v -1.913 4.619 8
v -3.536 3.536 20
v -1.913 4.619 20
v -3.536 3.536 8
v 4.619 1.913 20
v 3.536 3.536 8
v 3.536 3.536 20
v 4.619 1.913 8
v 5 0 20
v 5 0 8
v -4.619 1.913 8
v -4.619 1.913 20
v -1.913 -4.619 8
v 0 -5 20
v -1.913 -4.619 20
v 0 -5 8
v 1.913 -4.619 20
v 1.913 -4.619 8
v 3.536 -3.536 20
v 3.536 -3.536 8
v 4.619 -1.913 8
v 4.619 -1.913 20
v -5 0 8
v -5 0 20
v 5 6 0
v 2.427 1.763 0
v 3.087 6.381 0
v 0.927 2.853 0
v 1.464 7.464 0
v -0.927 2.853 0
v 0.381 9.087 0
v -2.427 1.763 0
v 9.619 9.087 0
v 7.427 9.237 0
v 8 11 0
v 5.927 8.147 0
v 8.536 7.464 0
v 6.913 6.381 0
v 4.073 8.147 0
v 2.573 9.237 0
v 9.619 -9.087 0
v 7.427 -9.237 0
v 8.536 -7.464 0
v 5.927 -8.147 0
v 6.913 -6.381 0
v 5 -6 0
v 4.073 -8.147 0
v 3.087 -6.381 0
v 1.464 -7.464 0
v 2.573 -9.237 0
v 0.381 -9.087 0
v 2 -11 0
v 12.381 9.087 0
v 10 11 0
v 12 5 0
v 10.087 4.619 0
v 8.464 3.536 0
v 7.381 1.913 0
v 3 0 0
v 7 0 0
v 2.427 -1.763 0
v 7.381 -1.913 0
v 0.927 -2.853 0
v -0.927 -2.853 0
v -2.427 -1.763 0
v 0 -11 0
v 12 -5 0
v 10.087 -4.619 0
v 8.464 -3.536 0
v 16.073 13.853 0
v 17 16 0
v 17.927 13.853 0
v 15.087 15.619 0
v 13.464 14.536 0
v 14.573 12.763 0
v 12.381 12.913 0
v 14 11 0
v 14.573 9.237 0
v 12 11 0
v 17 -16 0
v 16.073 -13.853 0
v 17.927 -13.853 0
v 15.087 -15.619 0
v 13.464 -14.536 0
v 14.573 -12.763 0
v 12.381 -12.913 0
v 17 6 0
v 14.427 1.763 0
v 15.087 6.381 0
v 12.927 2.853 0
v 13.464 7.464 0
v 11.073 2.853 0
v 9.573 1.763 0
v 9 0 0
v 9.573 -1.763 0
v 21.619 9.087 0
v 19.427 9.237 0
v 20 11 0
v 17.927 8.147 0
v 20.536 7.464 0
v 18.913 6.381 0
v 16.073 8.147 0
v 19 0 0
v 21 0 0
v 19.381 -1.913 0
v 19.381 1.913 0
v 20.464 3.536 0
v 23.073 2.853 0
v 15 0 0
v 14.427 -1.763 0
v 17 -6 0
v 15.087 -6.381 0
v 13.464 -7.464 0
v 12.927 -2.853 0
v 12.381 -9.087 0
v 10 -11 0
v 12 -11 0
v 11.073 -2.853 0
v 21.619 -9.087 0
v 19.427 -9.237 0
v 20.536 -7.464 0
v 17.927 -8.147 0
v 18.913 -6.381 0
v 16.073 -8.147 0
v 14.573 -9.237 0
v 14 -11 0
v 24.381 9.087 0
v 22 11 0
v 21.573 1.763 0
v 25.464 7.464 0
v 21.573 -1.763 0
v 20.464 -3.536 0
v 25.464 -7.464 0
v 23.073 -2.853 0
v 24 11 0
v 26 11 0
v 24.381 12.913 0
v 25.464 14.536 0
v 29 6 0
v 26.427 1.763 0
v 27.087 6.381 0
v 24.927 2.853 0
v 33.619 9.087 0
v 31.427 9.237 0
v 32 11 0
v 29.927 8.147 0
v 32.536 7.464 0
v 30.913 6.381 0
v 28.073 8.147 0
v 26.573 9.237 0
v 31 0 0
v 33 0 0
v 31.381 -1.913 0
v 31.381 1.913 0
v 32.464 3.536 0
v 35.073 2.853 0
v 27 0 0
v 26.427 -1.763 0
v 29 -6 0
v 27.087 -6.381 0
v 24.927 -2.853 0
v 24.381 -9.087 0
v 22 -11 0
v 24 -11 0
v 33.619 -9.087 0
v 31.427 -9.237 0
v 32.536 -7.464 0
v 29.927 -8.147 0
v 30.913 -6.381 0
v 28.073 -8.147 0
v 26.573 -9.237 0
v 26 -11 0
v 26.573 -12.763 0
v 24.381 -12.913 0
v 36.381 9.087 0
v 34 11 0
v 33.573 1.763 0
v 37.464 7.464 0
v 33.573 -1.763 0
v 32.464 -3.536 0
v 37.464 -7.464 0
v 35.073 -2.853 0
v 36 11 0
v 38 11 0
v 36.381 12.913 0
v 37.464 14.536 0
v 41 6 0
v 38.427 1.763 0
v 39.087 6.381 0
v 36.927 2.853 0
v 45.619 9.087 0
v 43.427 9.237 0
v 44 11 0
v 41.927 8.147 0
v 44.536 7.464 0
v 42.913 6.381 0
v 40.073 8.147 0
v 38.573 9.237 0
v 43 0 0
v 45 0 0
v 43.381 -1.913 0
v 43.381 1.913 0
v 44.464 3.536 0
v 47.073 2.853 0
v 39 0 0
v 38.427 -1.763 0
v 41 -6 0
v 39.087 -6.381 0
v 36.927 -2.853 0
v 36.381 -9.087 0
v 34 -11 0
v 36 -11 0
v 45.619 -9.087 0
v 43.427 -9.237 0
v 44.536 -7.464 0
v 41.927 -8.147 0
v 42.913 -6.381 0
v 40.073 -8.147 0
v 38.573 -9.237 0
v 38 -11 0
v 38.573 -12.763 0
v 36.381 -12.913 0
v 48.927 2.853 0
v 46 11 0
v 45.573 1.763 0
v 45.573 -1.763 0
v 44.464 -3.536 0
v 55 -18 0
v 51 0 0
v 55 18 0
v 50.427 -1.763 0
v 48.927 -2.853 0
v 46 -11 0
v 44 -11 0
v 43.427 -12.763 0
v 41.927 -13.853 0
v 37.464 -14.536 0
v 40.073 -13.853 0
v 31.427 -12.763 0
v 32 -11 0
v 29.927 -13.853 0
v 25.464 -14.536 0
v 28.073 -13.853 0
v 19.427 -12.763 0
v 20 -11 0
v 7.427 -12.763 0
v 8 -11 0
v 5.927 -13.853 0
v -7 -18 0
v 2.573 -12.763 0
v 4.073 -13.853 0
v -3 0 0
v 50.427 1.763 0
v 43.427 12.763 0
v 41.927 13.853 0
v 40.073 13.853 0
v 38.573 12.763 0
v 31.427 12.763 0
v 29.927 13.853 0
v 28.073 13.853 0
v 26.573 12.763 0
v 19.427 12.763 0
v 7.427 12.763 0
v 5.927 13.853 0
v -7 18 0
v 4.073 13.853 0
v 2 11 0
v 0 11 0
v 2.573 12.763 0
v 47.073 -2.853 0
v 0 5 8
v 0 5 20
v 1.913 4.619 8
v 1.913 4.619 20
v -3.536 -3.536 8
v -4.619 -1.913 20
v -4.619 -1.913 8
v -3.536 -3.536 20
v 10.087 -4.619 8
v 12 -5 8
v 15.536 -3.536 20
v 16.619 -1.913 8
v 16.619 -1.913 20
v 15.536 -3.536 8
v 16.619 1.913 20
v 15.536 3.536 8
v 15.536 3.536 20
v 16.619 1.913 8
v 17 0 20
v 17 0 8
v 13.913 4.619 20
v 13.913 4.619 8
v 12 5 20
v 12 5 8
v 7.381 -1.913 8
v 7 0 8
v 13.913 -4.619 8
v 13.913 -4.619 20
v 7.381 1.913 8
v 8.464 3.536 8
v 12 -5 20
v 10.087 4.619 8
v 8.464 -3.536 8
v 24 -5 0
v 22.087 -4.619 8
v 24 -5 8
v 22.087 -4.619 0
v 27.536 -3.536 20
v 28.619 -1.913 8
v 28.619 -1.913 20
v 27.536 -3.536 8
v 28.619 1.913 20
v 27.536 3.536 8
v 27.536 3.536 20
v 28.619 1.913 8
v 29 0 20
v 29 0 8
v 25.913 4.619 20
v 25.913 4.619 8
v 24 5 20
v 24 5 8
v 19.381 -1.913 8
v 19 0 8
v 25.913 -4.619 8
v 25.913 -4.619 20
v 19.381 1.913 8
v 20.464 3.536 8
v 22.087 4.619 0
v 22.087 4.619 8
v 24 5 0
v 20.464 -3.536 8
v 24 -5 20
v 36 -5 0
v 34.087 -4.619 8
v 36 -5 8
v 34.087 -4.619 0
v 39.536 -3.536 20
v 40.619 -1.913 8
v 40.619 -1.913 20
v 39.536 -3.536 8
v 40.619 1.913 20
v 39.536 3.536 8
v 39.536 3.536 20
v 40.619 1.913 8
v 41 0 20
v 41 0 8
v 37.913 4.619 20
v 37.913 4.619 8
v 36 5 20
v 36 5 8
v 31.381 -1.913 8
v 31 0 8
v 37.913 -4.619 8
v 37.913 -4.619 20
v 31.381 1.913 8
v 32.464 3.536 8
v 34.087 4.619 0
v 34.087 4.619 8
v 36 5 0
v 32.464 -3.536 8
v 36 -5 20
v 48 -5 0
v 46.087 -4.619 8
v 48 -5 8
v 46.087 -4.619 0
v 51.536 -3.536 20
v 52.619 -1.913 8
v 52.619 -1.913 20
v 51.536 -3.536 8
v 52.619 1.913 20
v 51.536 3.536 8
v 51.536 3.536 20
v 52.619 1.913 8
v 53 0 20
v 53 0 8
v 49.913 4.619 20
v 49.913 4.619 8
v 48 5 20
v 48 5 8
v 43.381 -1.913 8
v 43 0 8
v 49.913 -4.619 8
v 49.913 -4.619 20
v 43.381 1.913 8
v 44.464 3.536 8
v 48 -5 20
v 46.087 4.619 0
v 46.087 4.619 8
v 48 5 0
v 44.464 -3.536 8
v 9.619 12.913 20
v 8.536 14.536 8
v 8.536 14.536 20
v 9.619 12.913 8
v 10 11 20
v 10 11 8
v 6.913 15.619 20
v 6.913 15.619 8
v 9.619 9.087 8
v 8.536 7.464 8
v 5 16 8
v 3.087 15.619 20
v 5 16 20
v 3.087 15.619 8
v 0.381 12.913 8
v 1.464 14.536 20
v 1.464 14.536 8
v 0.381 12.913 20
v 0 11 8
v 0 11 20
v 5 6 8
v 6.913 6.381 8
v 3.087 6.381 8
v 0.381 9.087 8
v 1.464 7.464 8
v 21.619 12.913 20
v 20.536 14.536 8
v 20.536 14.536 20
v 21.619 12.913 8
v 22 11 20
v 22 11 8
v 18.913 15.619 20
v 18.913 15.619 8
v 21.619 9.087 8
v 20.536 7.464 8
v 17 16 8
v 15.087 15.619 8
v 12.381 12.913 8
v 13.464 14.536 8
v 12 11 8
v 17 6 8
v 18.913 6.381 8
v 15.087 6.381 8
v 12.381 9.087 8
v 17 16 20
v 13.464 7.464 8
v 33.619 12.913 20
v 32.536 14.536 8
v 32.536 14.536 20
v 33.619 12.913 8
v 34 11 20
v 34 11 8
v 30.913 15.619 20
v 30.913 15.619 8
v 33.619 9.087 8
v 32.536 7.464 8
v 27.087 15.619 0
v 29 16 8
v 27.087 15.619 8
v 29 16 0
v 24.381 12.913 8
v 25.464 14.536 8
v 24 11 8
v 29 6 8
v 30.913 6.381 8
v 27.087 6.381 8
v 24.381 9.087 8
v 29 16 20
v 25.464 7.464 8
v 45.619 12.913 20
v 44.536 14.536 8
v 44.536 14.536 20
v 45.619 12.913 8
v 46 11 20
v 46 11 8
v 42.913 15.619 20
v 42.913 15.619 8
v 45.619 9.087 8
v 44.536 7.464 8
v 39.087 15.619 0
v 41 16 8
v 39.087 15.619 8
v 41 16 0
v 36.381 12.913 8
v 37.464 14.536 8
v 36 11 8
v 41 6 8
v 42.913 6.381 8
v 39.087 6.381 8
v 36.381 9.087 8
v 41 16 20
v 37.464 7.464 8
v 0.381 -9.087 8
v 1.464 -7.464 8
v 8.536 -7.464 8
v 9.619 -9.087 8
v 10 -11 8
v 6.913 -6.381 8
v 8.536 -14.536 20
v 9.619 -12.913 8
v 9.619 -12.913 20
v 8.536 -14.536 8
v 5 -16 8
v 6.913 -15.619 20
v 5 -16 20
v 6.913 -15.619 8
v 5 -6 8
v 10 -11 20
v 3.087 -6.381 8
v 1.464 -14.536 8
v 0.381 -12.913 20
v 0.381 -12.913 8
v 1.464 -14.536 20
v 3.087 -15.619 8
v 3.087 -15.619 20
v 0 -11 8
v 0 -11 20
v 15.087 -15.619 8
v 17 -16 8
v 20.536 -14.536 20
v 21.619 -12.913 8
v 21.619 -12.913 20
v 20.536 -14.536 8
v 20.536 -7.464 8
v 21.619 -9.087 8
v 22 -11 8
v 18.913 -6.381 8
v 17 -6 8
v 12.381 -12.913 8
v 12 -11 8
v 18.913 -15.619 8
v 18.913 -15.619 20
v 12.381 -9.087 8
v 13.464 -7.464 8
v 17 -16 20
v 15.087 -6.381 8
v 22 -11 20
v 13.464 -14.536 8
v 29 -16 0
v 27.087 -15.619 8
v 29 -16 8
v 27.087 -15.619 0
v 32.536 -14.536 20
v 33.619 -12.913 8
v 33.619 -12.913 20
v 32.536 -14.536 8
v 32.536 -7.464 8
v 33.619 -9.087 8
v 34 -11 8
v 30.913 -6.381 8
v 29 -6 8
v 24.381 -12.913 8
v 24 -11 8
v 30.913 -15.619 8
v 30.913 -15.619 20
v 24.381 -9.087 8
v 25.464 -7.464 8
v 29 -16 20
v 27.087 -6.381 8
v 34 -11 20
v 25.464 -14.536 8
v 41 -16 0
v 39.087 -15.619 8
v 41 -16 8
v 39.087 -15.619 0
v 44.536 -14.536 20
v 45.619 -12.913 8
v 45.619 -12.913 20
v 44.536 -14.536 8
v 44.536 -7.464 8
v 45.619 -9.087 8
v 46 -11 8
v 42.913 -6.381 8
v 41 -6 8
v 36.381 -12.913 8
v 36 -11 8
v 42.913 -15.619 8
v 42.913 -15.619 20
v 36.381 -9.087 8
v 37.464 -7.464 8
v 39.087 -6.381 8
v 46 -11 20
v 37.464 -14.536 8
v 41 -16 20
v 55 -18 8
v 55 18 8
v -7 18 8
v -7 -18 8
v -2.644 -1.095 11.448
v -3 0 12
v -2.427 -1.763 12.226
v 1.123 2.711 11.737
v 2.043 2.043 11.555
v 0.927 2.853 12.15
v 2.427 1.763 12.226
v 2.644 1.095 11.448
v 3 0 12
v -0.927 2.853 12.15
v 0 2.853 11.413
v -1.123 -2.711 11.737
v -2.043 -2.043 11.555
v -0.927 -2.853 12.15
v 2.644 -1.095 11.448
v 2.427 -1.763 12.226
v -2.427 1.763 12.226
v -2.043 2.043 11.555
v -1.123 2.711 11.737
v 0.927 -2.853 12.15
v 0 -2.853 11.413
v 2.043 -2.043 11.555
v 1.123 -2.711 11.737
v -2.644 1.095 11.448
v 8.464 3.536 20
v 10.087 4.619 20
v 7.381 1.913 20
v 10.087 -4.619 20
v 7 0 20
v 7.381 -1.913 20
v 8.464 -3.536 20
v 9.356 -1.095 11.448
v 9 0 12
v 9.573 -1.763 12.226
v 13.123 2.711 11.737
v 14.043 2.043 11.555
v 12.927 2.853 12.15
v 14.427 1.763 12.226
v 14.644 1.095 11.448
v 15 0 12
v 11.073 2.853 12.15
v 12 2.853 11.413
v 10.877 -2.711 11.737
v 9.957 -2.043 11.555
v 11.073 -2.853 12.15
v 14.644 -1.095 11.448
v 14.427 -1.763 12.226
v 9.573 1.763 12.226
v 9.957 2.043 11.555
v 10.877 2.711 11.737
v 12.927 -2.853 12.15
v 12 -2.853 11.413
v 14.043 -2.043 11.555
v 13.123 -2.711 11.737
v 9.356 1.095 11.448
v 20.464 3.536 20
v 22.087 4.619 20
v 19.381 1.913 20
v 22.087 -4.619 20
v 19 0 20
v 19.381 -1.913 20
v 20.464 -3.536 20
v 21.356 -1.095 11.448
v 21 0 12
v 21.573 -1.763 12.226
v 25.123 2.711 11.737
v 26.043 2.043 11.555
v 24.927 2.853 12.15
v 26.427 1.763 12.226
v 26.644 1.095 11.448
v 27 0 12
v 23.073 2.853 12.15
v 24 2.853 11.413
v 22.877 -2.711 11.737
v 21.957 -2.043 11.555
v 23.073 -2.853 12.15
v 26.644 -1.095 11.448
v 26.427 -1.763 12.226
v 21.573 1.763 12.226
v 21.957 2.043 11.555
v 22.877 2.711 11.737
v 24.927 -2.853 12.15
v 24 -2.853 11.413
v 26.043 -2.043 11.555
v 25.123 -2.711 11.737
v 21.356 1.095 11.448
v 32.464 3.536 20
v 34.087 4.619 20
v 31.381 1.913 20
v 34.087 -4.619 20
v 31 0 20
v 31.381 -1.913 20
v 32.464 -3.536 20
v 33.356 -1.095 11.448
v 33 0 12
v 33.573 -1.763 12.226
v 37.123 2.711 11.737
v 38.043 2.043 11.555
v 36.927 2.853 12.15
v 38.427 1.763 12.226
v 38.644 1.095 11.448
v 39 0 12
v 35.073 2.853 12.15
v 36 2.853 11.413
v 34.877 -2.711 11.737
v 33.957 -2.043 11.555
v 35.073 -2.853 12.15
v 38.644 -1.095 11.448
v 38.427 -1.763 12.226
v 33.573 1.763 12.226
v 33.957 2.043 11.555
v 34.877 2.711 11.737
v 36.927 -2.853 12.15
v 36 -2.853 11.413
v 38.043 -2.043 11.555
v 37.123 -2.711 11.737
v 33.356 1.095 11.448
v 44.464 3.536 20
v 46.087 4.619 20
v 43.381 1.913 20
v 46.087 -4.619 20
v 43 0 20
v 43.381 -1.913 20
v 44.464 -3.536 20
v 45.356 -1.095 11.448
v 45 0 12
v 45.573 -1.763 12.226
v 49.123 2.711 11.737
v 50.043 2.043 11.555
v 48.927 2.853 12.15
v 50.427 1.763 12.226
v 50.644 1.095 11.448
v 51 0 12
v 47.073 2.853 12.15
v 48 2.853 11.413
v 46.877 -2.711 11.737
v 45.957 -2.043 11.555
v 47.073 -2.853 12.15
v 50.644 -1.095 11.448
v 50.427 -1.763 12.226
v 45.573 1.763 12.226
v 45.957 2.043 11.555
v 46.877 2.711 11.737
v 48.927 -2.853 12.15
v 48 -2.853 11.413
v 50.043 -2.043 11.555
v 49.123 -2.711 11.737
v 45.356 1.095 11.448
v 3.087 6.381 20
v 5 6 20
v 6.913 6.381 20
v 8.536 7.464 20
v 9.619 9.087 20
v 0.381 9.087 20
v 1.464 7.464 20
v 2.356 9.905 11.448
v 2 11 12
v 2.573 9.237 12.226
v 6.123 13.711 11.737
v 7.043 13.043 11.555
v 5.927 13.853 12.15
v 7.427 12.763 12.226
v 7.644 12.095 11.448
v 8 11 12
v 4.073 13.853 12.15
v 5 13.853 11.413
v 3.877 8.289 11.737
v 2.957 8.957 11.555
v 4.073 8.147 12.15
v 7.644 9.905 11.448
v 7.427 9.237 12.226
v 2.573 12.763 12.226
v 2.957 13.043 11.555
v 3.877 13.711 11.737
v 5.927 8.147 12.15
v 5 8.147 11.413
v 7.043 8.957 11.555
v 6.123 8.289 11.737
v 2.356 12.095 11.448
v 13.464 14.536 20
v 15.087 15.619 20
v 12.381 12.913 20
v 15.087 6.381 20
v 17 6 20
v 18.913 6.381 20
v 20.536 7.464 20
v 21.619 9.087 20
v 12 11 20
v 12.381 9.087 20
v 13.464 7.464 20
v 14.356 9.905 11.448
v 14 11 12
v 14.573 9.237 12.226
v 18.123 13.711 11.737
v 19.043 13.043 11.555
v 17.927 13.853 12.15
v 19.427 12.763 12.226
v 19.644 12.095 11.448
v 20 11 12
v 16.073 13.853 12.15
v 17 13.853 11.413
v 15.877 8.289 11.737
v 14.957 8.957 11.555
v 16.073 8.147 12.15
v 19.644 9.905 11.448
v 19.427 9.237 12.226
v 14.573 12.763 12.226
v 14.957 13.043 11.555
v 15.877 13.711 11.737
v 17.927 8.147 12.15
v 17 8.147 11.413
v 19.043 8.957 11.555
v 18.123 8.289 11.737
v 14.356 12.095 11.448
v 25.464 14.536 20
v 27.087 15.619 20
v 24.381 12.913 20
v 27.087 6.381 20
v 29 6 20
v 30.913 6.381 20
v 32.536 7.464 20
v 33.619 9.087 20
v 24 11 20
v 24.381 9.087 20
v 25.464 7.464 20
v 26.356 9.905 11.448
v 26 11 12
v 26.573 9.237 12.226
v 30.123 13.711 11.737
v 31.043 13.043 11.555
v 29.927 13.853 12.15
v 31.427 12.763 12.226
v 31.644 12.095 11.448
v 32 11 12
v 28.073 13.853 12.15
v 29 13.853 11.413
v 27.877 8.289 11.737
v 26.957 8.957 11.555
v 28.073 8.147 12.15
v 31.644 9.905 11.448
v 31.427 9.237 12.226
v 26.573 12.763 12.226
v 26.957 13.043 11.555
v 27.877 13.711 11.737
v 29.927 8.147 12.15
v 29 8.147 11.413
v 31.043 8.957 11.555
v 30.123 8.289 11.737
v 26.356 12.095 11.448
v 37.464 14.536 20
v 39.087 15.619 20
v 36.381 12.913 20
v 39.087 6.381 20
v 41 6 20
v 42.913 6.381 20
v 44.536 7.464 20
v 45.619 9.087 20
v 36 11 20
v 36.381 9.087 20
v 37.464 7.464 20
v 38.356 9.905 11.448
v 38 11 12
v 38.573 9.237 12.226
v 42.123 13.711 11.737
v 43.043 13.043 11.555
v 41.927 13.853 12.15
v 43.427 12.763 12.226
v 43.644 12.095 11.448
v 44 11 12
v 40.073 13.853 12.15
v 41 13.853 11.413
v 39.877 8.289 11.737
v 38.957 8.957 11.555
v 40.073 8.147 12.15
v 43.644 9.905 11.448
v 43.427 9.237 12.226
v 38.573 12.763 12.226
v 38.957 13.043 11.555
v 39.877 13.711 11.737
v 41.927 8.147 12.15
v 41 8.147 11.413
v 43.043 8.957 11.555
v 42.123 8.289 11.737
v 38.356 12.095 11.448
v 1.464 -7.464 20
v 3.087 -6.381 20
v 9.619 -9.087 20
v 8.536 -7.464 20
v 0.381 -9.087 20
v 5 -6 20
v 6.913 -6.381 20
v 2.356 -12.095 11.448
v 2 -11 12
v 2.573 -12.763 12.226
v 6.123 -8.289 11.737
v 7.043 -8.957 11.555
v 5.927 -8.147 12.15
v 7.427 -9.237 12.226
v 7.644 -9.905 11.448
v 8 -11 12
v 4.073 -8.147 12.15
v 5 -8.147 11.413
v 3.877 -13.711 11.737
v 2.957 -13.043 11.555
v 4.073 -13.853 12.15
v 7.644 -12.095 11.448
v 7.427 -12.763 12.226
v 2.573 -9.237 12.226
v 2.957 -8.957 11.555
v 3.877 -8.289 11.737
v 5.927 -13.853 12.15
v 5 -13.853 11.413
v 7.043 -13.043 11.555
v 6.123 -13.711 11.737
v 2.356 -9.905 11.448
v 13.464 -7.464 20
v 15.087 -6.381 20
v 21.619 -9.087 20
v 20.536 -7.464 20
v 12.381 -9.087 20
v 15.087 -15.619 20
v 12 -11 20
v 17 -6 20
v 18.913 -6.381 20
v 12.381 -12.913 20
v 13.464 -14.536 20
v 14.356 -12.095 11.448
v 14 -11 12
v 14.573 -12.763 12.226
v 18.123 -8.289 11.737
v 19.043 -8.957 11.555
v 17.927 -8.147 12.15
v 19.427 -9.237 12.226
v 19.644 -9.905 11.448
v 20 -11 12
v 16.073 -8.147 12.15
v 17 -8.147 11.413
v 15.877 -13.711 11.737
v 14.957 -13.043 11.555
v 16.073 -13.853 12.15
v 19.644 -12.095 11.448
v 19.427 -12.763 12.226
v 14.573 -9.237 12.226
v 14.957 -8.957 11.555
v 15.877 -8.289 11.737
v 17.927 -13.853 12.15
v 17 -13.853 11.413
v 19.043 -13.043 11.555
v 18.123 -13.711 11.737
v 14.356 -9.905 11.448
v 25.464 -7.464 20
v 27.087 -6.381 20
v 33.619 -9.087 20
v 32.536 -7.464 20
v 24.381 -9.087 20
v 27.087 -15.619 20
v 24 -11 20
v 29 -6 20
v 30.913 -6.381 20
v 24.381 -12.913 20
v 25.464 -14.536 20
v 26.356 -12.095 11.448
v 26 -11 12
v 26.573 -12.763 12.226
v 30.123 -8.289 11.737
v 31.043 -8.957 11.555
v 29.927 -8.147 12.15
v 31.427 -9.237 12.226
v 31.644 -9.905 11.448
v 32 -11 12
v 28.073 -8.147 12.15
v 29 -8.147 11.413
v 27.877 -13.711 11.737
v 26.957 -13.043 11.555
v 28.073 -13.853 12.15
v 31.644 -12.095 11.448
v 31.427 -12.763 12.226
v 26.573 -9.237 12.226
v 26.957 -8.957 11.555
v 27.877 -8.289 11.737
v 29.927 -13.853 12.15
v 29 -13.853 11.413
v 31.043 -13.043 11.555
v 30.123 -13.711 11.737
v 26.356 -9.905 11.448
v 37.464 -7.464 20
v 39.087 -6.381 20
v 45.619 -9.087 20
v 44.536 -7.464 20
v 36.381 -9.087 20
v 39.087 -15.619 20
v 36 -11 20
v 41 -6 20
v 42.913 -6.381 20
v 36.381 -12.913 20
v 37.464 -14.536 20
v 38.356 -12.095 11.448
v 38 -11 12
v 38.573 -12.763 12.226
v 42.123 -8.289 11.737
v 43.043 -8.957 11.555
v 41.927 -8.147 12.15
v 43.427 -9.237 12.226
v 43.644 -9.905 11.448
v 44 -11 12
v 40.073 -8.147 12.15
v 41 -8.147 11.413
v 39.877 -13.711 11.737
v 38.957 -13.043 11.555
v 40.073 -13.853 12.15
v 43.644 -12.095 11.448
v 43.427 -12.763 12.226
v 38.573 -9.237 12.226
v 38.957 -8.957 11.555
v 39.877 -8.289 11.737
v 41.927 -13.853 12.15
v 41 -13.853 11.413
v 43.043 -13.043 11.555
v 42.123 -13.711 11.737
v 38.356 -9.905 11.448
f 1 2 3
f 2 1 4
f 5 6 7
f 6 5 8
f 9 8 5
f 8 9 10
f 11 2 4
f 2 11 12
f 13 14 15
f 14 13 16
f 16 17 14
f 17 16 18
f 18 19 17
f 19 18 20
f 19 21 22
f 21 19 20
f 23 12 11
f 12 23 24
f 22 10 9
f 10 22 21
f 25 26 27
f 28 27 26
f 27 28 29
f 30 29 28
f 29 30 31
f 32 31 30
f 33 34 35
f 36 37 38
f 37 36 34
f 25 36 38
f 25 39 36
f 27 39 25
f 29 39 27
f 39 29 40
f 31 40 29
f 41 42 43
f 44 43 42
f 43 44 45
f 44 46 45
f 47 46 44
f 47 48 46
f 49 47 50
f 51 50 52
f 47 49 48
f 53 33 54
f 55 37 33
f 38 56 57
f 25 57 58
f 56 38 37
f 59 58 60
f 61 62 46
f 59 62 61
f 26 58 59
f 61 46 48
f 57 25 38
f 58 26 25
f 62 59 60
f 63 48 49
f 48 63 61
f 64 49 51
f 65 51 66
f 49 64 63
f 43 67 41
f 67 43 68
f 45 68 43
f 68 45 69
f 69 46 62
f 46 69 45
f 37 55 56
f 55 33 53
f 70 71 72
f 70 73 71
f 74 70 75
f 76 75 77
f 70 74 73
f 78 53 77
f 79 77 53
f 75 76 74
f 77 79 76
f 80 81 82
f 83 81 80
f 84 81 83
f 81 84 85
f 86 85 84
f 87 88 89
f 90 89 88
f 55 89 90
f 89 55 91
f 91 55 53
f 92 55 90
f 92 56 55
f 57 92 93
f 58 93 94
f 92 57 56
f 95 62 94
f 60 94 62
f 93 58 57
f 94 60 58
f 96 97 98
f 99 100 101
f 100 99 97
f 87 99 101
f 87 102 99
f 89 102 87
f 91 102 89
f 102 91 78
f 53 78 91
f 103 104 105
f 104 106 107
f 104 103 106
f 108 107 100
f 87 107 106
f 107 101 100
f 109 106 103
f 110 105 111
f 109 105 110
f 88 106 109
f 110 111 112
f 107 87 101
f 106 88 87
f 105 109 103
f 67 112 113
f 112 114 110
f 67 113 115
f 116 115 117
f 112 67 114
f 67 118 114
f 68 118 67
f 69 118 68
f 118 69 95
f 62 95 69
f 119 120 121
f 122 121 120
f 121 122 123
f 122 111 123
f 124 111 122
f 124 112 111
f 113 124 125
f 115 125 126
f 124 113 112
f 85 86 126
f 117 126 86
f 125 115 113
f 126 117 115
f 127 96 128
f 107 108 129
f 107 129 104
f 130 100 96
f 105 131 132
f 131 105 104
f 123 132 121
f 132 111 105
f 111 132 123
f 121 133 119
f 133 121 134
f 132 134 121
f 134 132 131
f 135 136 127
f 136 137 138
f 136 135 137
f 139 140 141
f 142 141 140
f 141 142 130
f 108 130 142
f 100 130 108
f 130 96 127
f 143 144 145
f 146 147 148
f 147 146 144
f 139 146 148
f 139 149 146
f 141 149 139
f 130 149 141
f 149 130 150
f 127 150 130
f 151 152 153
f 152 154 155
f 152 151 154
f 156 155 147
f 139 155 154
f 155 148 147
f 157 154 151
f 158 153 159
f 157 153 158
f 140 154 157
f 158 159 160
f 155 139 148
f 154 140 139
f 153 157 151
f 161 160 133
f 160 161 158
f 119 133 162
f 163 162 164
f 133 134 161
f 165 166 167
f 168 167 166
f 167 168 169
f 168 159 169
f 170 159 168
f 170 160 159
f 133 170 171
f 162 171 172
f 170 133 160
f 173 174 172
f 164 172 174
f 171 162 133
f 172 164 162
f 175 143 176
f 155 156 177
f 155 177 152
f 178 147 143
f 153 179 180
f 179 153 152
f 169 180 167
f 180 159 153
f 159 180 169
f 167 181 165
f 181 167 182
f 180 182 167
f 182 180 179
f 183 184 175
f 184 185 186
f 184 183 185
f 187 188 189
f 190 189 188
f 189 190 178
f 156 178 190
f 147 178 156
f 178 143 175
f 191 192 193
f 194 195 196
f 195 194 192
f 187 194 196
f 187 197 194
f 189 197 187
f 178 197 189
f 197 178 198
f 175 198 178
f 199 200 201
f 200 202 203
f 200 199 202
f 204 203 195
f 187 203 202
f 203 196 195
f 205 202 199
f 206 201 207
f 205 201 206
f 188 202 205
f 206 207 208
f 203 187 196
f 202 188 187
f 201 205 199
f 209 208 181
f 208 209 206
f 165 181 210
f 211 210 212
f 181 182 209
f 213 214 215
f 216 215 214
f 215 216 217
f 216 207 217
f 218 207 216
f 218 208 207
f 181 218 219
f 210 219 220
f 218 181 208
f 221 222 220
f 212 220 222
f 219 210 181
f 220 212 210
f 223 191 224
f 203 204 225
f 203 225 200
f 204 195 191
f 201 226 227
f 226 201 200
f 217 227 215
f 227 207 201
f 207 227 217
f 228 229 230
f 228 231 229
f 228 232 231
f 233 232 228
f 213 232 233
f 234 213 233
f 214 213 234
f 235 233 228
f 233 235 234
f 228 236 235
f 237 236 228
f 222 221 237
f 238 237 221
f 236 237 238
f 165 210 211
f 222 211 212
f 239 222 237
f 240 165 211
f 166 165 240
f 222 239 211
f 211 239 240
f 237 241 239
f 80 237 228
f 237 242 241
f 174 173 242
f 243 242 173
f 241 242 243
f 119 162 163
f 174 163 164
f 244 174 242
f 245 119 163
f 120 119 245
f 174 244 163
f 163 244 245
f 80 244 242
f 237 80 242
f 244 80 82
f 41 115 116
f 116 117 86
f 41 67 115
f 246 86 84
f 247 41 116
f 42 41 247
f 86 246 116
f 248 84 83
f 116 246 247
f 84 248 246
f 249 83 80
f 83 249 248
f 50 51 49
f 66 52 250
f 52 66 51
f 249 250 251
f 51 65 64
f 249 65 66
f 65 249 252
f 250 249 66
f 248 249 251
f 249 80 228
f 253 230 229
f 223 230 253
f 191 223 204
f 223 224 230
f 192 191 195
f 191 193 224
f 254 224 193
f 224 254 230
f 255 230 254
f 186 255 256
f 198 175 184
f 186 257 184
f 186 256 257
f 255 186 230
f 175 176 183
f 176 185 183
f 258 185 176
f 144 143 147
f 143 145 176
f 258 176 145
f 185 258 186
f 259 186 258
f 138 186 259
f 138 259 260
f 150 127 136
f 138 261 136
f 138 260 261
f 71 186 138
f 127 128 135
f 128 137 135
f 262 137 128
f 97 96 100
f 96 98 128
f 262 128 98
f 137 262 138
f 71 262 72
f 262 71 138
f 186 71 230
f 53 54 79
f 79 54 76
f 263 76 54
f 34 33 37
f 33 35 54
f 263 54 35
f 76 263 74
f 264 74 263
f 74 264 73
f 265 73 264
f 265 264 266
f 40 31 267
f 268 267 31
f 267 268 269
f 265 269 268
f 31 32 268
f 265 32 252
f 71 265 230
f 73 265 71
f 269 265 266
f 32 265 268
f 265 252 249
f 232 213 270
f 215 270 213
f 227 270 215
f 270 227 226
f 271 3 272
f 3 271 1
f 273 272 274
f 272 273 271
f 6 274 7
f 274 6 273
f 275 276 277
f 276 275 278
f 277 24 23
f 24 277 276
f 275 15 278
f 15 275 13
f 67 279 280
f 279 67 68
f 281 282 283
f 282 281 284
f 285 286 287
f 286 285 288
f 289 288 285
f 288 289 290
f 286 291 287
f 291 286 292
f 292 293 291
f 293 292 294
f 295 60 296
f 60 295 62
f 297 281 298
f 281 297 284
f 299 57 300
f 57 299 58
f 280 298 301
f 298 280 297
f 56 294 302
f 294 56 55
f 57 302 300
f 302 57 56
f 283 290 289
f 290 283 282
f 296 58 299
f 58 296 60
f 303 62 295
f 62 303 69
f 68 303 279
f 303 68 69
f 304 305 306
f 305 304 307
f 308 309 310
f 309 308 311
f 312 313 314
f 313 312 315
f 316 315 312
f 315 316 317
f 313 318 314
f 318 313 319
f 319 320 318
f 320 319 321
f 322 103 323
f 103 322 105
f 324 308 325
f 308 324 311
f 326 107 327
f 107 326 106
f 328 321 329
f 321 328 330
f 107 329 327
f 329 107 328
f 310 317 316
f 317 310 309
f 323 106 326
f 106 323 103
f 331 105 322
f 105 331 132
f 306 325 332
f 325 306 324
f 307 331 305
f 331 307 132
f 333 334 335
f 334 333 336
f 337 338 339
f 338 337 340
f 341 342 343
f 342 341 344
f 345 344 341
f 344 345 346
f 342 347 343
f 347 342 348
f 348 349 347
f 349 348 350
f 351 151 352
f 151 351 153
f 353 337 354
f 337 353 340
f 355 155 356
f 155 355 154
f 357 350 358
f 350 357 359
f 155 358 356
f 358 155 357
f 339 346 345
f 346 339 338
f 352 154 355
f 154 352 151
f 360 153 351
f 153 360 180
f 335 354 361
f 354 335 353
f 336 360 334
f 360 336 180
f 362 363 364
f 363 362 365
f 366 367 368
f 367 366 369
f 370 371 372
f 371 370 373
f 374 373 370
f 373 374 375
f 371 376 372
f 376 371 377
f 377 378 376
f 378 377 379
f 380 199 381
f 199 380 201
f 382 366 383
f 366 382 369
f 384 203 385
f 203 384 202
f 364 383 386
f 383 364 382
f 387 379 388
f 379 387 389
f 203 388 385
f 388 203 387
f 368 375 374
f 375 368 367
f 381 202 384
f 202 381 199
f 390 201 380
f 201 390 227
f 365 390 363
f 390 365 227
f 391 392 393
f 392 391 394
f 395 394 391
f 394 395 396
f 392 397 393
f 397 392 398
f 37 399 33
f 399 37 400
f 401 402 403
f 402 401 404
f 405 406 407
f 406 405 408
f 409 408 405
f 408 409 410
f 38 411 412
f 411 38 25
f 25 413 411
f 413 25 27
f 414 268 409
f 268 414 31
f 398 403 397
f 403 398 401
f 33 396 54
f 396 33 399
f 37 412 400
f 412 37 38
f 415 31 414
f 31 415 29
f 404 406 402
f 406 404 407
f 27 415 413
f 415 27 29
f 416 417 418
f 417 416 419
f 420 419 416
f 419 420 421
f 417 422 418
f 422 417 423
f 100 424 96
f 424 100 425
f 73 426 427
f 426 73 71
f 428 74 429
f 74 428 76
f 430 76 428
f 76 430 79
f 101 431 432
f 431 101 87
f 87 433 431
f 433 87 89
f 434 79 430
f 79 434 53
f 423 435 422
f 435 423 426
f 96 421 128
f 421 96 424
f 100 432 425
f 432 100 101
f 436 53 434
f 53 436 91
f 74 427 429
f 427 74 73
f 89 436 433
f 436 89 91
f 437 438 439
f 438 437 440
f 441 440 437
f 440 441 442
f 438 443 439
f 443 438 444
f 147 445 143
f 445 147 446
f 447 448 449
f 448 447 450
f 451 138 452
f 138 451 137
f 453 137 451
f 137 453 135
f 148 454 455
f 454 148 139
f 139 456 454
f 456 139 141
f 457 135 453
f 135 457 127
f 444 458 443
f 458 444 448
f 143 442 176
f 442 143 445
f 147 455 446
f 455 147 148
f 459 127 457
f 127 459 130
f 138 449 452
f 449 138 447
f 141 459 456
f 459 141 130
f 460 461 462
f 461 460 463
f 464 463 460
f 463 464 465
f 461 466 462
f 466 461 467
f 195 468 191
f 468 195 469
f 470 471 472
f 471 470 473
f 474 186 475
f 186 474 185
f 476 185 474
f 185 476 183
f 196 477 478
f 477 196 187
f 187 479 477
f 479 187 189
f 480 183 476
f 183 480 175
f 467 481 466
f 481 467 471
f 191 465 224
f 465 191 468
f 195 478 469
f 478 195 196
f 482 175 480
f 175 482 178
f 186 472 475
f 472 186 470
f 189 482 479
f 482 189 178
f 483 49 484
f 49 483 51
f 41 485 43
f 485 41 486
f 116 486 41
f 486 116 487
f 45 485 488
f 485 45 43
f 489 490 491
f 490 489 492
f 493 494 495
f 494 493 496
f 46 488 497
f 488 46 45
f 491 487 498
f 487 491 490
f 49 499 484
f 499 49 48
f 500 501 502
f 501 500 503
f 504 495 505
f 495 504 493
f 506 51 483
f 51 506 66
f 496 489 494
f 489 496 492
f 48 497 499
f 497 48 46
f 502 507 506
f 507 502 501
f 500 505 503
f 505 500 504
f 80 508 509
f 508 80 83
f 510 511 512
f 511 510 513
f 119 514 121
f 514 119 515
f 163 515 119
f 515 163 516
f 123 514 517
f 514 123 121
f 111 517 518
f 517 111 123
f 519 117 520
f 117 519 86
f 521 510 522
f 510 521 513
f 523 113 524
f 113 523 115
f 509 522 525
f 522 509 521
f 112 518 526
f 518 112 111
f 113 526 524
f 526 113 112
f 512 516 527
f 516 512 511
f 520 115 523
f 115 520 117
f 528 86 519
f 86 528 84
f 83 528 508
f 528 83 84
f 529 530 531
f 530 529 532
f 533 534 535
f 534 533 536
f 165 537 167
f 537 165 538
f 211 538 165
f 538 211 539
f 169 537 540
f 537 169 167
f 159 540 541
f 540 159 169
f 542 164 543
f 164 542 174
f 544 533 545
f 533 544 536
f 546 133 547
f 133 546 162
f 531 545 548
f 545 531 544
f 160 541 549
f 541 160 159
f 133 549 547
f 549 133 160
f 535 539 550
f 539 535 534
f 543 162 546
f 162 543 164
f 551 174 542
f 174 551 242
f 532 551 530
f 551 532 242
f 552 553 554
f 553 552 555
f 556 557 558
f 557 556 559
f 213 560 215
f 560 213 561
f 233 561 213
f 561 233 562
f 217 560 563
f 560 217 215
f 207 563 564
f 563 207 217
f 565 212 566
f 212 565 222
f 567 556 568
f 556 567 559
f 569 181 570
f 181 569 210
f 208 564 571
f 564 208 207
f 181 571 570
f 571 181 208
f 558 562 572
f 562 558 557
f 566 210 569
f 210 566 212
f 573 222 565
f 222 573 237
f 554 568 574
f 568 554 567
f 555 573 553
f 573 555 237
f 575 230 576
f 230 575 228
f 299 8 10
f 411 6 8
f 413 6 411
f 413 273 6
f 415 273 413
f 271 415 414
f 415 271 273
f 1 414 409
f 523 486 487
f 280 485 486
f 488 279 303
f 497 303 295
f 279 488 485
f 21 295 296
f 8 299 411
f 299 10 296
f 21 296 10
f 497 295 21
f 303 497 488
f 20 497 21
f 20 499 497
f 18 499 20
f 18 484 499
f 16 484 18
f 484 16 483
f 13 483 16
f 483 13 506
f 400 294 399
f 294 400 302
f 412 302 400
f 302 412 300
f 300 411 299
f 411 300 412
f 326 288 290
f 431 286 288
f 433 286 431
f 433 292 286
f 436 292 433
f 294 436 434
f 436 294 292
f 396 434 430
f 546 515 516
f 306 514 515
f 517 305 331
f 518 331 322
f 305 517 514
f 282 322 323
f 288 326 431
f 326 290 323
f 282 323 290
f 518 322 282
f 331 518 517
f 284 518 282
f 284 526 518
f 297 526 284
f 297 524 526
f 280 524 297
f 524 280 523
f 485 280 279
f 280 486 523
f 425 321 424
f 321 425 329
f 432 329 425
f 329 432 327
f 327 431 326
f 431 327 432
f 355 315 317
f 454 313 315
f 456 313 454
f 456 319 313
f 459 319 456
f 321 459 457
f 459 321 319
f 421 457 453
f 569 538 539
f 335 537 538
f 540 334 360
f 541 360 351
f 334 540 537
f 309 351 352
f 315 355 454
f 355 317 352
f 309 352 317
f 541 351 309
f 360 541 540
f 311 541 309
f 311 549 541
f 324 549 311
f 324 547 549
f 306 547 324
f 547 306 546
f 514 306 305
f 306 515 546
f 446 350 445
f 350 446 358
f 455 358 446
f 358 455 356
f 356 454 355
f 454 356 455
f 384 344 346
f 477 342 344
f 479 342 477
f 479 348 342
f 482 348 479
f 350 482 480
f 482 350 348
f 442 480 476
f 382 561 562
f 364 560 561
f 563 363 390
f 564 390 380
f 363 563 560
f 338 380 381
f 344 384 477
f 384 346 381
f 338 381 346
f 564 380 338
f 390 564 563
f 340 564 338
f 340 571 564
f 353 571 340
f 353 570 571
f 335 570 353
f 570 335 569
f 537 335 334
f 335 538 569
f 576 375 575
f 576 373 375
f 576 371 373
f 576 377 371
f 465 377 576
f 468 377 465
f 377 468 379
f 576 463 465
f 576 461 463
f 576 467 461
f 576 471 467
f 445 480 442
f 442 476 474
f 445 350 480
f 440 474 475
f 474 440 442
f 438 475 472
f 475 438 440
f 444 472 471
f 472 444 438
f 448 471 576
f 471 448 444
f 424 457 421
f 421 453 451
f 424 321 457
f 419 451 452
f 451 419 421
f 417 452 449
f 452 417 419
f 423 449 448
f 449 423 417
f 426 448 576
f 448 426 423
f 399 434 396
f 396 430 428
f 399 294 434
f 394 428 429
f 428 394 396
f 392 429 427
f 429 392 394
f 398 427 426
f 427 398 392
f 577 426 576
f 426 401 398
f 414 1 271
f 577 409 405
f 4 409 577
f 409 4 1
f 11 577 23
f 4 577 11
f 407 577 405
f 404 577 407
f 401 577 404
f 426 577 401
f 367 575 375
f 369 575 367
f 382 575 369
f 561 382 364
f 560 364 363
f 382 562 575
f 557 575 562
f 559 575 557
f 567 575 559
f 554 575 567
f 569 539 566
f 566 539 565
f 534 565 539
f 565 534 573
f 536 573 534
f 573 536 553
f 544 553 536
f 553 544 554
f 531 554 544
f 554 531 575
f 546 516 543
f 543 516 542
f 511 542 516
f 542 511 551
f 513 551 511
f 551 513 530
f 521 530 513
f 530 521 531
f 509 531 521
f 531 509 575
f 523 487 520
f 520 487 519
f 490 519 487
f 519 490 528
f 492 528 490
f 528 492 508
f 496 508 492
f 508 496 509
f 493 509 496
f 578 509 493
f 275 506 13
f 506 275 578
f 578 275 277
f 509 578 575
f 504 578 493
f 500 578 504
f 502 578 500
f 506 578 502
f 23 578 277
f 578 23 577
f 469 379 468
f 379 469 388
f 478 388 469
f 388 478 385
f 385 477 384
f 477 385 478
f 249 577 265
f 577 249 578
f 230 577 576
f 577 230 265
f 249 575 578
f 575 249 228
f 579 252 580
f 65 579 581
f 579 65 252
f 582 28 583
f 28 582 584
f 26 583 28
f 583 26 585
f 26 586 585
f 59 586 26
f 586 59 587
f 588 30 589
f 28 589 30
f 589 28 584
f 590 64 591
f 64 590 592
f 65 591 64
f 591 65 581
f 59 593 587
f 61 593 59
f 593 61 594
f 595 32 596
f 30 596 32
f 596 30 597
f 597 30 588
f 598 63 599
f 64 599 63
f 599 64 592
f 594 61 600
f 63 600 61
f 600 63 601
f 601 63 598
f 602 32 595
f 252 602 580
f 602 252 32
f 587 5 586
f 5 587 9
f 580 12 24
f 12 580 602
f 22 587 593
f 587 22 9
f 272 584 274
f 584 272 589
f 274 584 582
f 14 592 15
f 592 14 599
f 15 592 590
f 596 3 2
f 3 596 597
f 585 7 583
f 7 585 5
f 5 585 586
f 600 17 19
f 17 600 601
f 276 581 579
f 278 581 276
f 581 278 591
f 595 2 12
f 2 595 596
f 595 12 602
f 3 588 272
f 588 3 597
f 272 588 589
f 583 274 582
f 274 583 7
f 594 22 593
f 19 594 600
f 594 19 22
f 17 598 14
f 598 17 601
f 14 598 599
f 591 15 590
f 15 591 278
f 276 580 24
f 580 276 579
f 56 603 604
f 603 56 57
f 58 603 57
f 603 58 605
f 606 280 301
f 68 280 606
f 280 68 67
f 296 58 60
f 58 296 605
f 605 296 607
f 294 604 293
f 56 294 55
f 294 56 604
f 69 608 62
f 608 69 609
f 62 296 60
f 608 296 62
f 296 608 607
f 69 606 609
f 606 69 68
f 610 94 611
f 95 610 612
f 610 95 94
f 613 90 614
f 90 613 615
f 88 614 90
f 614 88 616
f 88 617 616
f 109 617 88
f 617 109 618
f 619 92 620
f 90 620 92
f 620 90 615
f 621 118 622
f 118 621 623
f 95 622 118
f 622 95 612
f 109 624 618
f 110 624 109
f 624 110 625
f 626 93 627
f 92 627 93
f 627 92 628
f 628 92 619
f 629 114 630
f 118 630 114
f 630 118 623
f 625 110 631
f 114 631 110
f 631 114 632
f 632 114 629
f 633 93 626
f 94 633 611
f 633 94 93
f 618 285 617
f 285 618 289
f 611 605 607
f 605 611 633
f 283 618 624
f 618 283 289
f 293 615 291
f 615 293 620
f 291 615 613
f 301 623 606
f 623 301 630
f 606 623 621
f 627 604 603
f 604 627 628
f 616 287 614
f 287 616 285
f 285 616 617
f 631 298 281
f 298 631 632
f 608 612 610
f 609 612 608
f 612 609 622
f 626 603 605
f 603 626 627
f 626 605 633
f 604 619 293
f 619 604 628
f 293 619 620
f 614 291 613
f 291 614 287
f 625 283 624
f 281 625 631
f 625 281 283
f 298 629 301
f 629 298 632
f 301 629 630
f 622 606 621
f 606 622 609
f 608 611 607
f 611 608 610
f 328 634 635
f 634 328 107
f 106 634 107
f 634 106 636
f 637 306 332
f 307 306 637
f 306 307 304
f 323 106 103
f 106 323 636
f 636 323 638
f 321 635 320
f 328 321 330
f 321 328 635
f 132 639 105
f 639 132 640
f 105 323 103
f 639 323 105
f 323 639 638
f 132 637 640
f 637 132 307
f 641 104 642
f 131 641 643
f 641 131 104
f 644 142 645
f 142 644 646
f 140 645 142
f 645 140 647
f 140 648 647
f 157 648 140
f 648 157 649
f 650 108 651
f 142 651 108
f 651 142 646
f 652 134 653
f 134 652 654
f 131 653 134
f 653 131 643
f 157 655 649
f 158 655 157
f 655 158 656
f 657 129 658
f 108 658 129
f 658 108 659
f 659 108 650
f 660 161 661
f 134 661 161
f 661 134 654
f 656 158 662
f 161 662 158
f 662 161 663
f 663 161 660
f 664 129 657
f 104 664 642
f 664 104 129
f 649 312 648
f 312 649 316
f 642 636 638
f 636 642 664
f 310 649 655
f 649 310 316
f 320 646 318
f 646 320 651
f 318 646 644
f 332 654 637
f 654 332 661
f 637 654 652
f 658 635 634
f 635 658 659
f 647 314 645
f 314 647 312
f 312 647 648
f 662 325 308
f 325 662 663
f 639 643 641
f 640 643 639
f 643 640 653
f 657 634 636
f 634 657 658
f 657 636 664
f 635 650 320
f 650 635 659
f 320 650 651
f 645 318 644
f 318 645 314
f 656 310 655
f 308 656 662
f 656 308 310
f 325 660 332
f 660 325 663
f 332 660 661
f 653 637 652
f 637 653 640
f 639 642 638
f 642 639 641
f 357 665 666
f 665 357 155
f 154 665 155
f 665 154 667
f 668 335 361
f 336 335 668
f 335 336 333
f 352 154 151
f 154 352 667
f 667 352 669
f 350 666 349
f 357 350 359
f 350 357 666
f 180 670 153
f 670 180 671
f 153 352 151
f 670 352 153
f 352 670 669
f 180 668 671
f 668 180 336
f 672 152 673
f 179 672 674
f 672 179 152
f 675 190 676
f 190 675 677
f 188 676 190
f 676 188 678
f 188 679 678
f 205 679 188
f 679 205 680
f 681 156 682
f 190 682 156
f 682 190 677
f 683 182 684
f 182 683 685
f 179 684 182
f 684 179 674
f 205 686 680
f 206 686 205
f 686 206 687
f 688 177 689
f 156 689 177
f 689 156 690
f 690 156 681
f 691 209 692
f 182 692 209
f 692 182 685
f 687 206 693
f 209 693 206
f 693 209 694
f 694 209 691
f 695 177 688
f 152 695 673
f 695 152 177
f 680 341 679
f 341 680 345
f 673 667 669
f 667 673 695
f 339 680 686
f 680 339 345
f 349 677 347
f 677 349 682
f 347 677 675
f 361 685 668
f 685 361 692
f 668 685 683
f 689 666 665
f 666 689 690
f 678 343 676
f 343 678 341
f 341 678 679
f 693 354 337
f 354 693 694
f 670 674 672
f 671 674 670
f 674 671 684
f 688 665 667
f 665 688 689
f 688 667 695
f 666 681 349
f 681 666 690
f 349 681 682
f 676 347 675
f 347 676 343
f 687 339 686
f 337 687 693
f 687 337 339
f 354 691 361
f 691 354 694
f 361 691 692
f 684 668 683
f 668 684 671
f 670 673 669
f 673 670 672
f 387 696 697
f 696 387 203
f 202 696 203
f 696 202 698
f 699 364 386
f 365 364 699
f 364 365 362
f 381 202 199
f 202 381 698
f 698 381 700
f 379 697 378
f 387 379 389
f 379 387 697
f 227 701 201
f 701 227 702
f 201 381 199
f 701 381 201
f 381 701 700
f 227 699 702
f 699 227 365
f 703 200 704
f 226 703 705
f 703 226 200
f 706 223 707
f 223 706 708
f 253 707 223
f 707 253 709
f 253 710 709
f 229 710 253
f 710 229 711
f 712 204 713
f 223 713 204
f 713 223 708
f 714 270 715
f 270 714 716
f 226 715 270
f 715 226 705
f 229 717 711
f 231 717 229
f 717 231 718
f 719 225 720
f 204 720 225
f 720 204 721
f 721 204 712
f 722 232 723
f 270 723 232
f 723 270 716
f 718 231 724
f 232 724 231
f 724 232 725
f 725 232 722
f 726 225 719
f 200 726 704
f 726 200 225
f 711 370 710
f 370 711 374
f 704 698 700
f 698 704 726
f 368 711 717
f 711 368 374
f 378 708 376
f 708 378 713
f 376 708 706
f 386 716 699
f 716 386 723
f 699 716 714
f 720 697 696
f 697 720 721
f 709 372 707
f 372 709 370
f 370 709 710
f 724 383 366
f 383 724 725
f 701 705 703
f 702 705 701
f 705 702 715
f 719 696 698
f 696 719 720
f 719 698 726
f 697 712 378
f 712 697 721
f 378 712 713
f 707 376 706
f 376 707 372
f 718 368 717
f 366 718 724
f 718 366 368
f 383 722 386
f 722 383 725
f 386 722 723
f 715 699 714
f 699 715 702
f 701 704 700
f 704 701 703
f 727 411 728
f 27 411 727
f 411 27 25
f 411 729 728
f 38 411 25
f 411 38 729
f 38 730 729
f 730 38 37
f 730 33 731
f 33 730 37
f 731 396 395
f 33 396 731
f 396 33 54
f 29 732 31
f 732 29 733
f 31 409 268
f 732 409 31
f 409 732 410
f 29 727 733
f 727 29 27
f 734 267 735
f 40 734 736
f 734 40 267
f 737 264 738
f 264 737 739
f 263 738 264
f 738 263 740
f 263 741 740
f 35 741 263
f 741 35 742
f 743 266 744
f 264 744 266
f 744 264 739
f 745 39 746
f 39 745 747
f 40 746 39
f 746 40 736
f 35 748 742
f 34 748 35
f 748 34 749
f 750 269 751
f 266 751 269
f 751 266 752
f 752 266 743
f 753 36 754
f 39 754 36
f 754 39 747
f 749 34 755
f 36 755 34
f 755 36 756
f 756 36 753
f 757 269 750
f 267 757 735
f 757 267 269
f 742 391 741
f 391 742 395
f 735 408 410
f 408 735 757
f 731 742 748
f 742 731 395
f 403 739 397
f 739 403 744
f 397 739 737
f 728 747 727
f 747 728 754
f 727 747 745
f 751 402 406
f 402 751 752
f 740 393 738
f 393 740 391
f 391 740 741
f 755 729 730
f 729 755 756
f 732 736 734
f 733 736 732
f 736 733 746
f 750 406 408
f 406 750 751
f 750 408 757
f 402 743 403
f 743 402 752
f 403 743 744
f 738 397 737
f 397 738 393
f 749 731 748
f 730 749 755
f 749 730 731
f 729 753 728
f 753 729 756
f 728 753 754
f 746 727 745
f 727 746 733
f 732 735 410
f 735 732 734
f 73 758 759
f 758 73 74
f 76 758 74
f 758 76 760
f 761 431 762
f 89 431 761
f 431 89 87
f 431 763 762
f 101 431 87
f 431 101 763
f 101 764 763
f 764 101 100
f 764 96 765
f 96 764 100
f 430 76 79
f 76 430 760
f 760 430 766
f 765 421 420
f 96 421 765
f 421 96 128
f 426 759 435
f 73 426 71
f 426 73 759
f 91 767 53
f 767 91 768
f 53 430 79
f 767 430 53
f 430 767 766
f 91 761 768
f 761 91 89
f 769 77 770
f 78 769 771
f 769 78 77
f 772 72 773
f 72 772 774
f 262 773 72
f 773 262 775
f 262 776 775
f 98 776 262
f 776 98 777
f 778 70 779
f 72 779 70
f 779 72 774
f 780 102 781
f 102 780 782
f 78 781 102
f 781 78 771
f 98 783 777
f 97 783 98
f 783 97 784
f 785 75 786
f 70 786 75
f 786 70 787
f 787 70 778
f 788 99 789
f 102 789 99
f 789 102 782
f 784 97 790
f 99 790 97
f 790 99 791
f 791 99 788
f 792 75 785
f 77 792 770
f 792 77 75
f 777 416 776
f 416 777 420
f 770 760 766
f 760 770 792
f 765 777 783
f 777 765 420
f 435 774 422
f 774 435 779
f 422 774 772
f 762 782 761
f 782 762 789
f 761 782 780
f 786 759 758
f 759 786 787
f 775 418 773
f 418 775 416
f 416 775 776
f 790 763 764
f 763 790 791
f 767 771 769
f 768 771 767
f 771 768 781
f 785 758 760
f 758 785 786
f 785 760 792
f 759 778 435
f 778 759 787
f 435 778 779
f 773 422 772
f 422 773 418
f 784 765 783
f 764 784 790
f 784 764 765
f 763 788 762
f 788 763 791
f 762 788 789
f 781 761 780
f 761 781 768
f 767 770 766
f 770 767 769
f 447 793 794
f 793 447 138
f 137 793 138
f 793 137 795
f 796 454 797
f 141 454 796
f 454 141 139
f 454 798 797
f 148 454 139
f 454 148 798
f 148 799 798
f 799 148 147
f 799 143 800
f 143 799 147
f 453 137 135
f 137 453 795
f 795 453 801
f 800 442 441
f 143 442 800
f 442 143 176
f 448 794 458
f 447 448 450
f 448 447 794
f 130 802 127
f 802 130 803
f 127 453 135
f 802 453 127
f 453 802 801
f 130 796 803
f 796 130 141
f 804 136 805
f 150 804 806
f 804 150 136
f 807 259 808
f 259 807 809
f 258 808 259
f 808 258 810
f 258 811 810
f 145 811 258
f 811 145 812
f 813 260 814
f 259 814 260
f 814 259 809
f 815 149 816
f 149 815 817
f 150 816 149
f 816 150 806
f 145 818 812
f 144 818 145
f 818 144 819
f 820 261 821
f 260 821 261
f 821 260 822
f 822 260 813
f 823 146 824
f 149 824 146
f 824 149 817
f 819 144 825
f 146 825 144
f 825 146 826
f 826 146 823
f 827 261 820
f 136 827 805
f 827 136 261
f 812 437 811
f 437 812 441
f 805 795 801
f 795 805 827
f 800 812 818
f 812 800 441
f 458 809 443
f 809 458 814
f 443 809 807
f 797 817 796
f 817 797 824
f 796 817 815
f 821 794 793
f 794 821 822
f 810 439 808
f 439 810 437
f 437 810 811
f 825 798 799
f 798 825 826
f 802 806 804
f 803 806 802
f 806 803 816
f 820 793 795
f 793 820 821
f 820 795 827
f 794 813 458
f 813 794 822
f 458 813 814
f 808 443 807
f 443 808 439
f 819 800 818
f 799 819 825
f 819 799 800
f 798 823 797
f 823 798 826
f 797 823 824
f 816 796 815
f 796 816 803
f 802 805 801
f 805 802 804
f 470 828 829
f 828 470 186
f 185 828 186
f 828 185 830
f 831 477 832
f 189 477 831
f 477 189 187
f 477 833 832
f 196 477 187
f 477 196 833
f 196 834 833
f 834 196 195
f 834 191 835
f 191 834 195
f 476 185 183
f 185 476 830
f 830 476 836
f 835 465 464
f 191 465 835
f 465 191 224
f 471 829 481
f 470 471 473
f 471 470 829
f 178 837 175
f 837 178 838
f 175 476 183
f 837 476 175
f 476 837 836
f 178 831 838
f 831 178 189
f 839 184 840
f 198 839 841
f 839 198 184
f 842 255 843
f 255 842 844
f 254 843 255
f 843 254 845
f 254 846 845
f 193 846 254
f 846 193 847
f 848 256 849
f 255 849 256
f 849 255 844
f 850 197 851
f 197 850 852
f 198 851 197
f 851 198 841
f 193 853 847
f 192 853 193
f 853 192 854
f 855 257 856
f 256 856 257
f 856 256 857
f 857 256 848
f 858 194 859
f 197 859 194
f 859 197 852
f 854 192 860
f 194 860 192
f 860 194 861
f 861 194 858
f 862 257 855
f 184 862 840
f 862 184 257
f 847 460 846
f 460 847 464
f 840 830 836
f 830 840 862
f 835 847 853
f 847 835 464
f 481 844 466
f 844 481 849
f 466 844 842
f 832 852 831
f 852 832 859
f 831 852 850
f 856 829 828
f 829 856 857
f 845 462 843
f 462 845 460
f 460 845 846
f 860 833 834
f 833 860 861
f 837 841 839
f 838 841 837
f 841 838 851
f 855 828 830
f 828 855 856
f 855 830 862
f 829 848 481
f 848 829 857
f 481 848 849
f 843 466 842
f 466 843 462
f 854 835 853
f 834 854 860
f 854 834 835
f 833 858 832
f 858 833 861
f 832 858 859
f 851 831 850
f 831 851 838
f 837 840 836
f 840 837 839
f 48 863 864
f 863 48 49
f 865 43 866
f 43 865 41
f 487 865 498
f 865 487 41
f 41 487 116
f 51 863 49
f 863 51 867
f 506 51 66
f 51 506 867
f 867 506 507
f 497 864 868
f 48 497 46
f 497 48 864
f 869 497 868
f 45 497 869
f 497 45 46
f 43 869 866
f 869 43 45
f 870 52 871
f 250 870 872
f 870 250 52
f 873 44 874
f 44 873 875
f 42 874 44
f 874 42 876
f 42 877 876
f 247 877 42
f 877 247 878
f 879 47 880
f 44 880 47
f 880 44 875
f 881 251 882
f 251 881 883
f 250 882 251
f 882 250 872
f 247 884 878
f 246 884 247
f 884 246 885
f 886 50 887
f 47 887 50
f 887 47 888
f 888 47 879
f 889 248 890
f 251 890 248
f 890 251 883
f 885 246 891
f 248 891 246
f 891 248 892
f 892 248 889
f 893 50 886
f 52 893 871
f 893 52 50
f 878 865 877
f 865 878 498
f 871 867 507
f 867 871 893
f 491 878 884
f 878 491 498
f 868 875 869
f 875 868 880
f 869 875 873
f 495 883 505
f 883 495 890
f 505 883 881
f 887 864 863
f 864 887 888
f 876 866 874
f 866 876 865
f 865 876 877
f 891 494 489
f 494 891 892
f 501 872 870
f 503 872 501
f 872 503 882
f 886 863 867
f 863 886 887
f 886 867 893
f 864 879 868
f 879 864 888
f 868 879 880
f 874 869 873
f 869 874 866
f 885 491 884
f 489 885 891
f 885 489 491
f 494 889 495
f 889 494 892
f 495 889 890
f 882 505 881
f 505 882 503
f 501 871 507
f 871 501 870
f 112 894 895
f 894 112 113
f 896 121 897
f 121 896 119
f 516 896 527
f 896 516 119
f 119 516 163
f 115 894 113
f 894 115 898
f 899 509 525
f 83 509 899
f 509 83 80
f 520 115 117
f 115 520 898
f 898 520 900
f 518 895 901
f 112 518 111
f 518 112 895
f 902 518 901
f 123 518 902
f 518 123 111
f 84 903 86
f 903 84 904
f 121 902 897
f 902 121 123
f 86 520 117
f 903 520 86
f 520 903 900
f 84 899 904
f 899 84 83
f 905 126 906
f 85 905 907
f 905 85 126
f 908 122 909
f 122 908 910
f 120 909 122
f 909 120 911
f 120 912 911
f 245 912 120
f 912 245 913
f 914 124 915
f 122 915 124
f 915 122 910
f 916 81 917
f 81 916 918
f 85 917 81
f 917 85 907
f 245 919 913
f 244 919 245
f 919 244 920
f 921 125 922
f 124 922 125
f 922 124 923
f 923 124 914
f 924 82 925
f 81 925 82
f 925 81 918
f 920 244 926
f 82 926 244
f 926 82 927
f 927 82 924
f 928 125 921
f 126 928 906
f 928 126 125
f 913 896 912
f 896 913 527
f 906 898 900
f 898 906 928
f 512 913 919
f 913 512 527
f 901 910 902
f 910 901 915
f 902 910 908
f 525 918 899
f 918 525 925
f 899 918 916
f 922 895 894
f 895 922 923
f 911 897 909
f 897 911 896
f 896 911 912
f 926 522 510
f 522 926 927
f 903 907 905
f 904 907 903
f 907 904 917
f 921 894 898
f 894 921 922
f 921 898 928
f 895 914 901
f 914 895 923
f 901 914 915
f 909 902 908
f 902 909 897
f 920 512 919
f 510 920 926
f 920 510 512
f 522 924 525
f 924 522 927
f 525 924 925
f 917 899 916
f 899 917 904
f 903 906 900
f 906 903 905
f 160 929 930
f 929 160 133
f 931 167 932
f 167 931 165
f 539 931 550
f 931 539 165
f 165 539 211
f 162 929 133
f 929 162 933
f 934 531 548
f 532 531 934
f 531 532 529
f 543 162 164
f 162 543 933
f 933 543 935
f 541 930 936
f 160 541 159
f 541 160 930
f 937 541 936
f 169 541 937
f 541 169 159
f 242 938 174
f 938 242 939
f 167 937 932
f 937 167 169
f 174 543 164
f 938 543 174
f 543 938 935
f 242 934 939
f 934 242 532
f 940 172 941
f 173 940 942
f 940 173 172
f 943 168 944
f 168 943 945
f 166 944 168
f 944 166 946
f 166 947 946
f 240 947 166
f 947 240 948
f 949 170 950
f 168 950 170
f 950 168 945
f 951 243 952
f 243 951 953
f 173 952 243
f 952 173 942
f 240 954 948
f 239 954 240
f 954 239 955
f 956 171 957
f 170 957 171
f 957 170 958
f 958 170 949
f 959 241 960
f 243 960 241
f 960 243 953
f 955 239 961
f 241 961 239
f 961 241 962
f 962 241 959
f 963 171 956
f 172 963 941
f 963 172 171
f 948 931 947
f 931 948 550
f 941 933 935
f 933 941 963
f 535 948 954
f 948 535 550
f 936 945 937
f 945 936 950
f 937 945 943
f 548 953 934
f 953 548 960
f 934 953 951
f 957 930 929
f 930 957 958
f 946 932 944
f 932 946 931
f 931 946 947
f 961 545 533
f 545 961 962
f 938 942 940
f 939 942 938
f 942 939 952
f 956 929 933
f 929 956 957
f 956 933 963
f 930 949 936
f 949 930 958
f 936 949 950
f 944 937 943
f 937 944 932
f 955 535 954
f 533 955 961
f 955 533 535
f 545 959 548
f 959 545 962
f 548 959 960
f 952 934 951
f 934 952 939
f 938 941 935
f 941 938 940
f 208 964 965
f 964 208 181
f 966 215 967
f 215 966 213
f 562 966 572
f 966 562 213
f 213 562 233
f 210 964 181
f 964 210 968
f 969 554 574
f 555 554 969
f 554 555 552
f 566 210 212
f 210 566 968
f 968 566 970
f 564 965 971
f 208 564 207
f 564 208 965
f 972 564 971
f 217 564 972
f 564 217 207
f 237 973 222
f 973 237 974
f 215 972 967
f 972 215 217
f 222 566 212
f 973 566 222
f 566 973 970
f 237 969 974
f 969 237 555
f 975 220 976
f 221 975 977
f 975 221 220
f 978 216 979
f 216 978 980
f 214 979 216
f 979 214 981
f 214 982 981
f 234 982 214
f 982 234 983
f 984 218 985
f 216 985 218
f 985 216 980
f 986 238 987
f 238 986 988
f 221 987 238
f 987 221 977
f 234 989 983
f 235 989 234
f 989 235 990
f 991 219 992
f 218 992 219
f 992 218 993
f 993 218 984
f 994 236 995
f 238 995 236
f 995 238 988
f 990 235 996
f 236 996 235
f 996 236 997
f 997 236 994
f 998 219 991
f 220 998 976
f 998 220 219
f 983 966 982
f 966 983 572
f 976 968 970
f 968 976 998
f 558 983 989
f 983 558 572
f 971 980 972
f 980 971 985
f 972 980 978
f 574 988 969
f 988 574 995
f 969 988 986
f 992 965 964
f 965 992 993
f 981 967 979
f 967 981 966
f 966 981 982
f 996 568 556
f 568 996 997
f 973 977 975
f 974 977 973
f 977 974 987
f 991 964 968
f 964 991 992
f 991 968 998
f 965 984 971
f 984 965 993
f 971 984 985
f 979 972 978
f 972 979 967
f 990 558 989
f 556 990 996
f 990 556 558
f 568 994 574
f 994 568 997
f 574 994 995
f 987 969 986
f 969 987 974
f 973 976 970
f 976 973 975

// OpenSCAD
radius = 5;
height = 20;

difference(){

translate([-7, -18, 0]){
    cube([62, 36, 08]);
};

for(i = [0:4]){
    translate([i * (radius + 7), 0, 0]){
        cylinder(height, radius, radius);
    };
};

translate([5, 0, 0]){
    for(i = [0:3]){
        translate([i * (radius + 7), 11, 0]){
            cylinder(height, radius, radius);
        };
    };
};

translate([5, 0, 0]){
    for(i = [0:3]){
        translate([i * (radius + 7), - 11, 0]){
            cylinder(height, radius, radius);
        };
    };
};


};

for(i = [0:4]){
    translate([i * (radius + 7), 0, 0]){
        difference(){
            cylinder(height, radius, radius);
            cylinder(height, radius - 2, radius - 2);
            cylinder(height, 0, radius);
        };
    };
};

translate([5, 0, 0]){
    for(i = [0:3]){
        translate([i * (radius + 7), 11, 0]){
            difference(){
                cylinder(height, radius, radius);
                cylinder(height, radius - 2, radius - 2);
                cylinder(height, 0, radius);
            };
        };
    };
};

translate([5, 0, 0]){
    for(i = [0:3]){
        translate([i * (radius + 7), - 11, 0]){
            difference(){
                cylinder(height, radius, radius);
                cylinder(height, radius - 2, radius - 2);
                cylinder(height, 0, radius);
            };
        };
    };
};
